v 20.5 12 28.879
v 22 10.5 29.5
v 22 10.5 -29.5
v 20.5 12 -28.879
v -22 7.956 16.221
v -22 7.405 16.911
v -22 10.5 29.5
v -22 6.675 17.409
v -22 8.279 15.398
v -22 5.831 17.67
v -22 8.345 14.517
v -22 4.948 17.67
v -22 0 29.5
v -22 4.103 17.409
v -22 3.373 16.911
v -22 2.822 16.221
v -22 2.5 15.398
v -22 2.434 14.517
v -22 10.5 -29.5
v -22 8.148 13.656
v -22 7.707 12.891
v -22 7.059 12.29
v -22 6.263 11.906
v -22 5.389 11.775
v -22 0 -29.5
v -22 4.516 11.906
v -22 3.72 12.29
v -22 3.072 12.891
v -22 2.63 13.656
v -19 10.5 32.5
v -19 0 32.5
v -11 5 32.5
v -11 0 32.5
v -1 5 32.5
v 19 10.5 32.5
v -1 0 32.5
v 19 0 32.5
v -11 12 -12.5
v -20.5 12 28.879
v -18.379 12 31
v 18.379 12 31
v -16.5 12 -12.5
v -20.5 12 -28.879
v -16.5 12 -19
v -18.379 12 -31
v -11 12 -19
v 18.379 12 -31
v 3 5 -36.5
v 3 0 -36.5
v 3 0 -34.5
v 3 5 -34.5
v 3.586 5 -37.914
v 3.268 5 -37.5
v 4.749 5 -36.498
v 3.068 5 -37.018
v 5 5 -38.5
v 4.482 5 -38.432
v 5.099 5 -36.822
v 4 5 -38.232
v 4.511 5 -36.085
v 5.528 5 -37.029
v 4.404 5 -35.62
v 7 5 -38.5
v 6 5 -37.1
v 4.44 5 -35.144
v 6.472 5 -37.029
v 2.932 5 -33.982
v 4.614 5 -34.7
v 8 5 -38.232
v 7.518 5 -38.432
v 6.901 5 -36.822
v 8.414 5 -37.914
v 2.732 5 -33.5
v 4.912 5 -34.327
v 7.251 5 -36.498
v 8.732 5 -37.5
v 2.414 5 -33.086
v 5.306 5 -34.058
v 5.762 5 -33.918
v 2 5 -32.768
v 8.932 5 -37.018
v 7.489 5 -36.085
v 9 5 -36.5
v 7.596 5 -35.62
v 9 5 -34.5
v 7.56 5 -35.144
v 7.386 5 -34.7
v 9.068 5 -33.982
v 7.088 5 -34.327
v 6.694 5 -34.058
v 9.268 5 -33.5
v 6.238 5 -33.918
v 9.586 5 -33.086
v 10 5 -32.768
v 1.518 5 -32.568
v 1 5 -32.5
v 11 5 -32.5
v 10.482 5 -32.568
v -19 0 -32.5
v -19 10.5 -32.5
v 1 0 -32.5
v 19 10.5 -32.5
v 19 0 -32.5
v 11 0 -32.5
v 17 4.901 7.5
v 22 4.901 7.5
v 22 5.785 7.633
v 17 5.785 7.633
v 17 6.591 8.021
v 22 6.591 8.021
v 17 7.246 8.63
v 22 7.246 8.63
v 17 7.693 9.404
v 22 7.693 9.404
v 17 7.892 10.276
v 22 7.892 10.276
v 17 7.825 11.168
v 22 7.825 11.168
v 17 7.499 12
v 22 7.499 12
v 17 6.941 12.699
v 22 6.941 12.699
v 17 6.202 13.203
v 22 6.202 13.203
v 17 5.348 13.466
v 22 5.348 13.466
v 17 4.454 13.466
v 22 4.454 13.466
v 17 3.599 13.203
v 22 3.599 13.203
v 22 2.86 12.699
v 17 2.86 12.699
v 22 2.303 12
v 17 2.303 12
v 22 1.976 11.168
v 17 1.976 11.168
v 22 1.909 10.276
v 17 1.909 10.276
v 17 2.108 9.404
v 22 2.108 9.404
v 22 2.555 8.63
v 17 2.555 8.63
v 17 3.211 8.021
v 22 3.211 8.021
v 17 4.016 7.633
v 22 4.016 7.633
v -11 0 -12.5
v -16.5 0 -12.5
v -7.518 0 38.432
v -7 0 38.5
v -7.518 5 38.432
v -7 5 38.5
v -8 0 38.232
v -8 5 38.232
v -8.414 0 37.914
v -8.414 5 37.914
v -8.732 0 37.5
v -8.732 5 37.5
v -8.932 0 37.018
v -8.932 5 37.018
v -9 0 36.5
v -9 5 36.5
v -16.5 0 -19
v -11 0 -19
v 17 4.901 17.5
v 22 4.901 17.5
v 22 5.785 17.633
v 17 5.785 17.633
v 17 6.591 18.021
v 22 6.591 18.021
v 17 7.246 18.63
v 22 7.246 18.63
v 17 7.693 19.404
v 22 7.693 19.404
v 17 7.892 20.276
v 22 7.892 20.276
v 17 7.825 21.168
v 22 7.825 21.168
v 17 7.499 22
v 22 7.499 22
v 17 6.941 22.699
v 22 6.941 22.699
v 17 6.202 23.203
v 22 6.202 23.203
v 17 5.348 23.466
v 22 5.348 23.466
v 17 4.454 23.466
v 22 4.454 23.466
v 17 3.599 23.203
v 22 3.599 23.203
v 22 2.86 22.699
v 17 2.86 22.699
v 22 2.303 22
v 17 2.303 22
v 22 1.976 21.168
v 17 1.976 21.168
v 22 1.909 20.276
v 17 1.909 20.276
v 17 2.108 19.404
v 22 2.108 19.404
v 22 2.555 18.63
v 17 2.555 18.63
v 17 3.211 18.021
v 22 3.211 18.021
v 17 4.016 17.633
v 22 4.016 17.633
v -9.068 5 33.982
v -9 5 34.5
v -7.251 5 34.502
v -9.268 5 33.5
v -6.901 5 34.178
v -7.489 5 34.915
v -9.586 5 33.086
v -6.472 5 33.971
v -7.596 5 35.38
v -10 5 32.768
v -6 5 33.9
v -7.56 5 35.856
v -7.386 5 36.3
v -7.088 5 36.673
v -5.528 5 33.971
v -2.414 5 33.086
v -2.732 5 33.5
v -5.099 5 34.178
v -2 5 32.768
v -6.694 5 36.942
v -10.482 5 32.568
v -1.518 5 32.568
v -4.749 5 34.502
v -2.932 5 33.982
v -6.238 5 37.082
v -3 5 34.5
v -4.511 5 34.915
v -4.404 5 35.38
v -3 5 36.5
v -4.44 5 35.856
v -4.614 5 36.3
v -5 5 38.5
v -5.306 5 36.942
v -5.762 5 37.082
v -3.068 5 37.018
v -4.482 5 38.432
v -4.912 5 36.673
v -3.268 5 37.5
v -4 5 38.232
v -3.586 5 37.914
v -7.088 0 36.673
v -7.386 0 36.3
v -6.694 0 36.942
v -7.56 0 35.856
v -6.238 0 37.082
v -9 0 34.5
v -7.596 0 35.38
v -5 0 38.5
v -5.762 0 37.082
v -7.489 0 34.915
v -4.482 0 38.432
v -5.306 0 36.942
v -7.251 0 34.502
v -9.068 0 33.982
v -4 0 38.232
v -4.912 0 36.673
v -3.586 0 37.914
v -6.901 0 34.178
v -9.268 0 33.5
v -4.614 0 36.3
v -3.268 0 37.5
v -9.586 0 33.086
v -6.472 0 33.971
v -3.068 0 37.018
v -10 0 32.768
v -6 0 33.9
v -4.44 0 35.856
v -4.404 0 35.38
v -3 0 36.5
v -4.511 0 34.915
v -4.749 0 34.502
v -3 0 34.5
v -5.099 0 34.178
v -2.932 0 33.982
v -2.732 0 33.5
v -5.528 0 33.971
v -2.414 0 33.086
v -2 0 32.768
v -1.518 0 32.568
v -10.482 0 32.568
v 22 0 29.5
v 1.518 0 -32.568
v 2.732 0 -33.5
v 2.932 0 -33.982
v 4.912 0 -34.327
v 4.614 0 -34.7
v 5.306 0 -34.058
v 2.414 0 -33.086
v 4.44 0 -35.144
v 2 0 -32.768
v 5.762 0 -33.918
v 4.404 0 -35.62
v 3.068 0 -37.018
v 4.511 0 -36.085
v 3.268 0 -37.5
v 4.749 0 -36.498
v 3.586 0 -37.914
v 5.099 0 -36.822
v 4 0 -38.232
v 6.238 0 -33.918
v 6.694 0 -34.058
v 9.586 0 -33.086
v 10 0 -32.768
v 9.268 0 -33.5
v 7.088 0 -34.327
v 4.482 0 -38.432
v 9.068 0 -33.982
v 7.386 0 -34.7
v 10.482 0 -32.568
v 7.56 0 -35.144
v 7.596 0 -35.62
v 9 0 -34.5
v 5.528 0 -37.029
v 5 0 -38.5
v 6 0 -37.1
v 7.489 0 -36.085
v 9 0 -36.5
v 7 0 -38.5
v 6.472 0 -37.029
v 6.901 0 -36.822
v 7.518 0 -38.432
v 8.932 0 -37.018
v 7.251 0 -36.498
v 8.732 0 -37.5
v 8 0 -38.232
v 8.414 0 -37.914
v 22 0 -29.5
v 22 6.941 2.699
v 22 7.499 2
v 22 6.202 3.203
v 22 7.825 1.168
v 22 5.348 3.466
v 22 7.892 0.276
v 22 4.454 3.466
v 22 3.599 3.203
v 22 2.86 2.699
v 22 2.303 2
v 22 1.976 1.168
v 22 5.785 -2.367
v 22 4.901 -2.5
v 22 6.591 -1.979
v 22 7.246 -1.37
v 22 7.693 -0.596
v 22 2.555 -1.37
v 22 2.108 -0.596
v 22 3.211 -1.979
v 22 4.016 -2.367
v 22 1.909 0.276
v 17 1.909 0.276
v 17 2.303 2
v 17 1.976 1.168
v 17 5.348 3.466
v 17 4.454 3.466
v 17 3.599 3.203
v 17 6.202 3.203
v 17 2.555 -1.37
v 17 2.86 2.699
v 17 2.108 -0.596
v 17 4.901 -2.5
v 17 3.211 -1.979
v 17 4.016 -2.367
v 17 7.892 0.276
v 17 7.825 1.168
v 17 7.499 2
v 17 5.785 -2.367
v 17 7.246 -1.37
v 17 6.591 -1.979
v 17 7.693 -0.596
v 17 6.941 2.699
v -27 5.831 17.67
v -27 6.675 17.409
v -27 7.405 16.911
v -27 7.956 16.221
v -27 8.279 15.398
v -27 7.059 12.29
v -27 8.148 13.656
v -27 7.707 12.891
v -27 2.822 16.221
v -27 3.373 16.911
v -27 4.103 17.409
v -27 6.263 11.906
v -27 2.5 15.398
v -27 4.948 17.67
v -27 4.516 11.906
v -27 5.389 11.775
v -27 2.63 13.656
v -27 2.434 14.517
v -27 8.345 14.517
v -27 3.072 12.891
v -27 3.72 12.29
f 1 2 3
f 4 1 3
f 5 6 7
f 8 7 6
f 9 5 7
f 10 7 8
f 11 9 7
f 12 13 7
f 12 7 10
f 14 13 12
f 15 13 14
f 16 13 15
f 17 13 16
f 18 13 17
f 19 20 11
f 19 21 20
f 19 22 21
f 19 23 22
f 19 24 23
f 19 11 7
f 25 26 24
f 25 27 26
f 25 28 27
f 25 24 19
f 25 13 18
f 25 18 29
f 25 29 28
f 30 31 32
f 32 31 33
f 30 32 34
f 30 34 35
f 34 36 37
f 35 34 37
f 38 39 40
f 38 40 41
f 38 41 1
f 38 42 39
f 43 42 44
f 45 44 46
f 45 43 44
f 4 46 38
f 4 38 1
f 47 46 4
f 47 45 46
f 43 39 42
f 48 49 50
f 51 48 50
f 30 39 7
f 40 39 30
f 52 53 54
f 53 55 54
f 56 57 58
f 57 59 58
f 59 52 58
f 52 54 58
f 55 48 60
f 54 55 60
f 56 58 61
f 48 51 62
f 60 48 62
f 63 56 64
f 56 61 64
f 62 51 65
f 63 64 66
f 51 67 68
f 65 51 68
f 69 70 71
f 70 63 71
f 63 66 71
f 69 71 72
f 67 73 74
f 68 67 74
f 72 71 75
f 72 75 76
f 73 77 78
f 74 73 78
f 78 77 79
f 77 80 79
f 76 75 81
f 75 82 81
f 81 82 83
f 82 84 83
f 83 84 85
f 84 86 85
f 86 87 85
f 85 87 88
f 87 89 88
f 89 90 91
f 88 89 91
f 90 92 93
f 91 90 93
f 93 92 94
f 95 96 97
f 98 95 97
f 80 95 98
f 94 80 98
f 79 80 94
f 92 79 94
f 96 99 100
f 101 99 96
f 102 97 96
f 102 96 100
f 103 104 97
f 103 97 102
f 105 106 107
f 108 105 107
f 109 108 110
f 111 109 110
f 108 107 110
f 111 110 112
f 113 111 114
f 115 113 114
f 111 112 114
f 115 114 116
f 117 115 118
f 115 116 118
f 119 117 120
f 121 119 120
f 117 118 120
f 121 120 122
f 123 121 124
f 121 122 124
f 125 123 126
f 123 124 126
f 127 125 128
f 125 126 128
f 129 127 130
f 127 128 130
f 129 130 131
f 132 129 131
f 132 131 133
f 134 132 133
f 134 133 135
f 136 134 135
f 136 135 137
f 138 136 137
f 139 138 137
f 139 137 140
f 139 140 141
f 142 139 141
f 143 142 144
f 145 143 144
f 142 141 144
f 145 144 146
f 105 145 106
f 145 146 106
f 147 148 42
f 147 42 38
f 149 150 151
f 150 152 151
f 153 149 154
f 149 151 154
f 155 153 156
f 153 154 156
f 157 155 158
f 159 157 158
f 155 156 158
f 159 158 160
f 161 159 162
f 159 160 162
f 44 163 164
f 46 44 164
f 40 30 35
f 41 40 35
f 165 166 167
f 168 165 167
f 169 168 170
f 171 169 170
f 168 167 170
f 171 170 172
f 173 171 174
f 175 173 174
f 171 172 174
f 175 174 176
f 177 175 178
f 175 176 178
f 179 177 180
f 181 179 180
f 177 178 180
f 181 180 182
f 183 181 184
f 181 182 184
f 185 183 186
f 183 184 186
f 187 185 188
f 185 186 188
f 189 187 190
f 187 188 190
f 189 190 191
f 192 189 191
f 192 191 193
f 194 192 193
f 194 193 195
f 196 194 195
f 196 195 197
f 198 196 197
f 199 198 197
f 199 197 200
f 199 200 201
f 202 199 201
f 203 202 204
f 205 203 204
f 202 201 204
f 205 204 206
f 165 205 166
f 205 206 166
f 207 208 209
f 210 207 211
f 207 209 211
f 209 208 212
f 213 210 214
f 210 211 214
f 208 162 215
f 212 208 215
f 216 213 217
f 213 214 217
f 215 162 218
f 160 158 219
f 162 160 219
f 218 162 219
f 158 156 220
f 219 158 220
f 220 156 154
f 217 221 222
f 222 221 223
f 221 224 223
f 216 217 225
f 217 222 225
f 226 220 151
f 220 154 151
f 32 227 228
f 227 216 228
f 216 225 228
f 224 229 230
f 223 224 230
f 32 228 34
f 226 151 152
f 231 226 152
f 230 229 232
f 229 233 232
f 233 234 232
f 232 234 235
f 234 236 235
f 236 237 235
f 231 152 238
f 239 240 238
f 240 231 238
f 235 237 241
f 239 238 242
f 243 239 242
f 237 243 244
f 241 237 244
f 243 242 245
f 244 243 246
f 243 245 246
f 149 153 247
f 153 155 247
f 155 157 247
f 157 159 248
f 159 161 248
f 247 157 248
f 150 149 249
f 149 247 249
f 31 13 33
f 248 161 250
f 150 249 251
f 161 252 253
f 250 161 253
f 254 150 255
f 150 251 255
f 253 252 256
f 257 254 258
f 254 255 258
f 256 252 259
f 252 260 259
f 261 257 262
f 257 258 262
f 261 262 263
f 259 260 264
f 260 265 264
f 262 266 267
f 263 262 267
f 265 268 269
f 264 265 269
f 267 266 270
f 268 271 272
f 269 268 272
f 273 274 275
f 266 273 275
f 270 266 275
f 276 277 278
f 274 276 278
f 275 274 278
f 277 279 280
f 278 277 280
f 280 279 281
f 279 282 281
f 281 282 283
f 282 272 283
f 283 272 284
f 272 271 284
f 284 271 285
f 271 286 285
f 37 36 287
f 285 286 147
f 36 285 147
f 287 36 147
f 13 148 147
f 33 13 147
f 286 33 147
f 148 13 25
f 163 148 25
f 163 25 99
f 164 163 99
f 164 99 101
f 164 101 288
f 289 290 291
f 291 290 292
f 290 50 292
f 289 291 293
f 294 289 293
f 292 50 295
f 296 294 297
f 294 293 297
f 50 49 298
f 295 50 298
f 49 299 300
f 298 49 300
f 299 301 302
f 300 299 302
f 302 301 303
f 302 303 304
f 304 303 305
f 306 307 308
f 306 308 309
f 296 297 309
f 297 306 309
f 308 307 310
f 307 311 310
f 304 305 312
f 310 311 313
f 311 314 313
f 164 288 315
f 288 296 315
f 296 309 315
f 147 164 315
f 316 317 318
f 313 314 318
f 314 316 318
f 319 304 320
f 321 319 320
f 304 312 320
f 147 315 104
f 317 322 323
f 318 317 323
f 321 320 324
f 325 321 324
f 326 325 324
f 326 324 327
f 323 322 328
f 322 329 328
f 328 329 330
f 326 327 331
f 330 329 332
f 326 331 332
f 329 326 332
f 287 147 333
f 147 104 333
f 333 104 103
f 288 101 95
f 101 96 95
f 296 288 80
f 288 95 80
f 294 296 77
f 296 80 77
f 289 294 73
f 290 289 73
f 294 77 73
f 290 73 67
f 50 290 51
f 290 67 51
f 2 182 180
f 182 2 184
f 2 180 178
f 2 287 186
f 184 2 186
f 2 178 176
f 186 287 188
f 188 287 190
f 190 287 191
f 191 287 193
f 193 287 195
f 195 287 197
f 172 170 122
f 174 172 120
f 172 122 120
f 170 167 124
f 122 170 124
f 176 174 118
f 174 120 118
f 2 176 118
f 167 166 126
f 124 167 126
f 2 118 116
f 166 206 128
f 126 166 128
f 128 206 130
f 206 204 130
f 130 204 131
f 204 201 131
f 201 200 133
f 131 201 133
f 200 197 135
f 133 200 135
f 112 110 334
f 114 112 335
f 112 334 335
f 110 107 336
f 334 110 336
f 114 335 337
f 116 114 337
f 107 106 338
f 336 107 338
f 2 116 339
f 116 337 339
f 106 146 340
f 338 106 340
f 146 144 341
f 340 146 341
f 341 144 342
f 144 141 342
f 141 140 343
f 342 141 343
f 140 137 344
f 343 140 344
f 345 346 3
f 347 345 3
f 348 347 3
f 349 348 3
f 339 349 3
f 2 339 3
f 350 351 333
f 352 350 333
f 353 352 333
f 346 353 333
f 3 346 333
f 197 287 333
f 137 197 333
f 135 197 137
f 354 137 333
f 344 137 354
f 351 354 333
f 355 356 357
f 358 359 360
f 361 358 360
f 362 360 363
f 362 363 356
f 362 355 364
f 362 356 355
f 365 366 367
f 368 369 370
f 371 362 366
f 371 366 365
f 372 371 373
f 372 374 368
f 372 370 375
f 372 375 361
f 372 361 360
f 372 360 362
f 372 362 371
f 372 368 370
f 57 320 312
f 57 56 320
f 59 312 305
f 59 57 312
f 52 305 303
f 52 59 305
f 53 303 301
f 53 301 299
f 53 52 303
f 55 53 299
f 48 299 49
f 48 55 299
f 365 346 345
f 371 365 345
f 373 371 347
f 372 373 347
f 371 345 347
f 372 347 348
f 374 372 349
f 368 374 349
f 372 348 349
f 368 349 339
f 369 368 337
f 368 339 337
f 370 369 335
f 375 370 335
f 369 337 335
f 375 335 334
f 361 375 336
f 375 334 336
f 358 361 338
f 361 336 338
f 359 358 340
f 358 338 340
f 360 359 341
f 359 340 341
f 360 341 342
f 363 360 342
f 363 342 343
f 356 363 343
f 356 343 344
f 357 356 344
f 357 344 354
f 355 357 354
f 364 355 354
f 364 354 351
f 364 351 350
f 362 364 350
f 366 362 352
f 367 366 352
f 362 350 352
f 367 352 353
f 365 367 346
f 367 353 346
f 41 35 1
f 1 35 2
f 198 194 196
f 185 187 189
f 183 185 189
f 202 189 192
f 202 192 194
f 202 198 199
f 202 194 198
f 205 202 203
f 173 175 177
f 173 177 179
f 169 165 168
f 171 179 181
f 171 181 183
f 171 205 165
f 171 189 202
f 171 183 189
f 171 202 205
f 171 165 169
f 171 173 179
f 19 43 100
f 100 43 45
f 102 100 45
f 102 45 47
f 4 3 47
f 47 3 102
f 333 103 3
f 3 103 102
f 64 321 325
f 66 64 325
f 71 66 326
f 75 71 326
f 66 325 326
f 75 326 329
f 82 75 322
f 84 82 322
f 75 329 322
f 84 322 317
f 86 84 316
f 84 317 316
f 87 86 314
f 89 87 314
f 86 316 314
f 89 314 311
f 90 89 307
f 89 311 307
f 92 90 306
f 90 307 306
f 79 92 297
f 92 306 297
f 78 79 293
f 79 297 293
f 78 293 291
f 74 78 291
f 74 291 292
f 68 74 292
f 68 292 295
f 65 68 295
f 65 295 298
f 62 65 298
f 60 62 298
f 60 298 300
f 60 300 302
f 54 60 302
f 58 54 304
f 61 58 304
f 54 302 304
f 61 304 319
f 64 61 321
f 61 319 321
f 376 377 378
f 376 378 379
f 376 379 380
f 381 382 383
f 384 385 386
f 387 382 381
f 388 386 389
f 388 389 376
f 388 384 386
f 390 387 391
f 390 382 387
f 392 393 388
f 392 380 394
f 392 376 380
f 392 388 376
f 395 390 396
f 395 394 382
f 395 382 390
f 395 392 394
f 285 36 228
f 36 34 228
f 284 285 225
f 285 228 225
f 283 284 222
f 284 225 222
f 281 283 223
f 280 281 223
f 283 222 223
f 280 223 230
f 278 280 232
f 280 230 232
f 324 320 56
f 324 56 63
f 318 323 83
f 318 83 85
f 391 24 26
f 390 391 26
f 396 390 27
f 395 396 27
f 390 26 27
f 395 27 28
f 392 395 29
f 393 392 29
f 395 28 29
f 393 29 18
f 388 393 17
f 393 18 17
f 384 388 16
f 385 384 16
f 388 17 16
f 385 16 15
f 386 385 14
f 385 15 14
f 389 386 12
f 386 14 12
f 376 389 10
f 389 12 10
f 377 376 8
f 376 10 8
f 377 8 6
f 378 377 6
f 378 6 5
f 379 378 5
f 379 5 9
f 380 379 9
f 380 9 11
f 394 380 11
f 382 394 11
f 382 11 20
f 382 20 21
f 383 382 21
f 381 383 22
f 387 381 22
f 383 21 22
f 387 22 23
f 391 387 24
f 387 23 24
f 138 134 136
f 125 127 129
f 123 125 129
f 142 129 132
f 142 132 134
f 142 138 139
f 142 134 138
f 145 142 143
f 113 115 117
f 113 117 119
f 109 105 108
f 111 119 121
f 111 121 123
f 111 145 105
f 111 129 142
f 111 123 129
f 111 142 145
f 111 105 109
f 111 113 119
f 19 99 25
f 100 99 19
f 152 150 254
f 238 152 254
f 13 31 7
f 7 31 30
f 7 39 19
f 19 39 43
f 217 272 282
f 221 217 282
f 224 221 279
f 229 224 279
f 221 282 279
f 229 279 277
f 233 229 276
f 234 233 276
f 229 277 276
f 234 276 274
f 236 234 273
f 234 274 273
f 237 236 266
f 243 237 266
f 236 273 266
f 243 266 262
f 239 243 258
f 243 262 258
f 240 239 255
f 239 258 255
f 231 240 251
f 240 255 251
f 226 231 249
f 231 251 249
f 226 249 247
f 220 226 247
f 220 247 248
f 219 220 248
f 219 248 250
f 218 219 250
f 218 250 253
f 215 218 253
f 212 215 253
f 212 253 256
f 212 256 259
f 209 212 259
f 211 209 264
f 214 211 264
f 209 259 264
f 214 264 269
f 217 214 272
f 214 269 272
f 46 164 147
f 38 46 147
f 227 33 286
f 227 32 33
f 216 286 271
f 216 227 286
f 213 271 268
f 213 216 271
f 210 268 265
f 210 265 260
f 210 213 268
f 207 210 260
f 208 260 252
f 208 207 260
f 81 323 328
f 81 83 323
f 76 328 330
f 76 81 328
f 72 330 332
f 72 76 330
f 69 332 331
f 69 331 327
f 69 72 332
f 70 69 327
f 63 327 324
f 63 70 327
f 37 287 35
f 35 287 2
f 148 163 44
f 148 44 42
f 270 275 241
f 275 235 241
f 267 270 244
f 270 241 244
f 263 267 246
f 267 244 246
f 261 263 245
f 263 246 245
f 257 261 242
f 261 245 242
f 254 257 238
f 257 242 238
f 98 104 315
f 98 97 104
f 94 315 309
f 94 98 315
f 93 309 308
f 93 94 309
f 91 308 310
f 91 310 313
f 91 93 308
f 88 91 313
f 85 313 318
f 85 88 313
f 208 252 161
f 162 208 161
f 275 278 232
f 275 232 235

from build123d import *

# Parameters (mm, degrees)
SKETCH_1_W          = 44
SKETCH_1_H          = 65
EXTRUDE_1_DEPTH     = 12
CHAMFER_1_SIZE      = 3
CHAMFER_2_SIZE      = 1.5
SKETCH_2_W          = 6
SKETCH_2_H          = 6
SKETCH_2_R          = 1.6
EXTRUDE_2_DEPTH     = 5
FILLET_1_R          = 2
FILLET_2_R          = 2
SKETCH_3_R          = 3
CUT_EXTRUDE_1_DEPTH = 5
SKETCH_4_R          = 2.96404504
EXTRUDE_3_DEPTH     = 5
SKETCH_5_W          = 5.5
SKETCH_5_H          = 6.5
CUT_EXTRUDE_2_DEPTH = 49.53091798


with BuildPart() as part:
    # 草图1 → 凸台-拉伸1 (new body)
    with BuildSketch(Plane(origin=(0, 0, 0), x_dir=(1, 0, 0), z_dir=(0, 1, 0))):
        Rectangle(SKETCH_1_W, SKETCH_1_H)
    extrude(amount=EXTRUDE_1_DEPTH)

    # 倒角1
    chamfer_1_edges = [part.edges().sort_by_distance(p)[0] for p in [
        (22, 6, 32.5),
        (-22, 6, 32.5),
        (-22, 6, -32.5),
        (22, 6, -32.5),
    ]]
    chamfer(chamfer_1_edges, length=CHAMFER_1_SIZE)

    # 倒角2
    chamfer_2_edges = [part.edges().sort_by_distance(p)[0] for p in [
        (-22, 12, 0),
        (0, 12, -32.5),
        (22, 12, 0),
        (0, 12, 32.5),
        (-20.5, 12, 31),
        (20.5, 12, 31),
        (20.5, 12, -31),
        (-20.5, 12, -31),
    ]]
    chamfer(chamfer_2_edges, length=CHAMFER_2_SIZE)

    # 草图2 → 凸台-拉伸2 (add)
    # profile 1 of 2: a face of its own
    with BuildSketch(Plane.XZ):
        with Locations((-6, 35.5)):
            Rectangle(SKETCH_2_W, SKETCH_2_H)
        with Locations(Location((-6, 35.5, 0), (0, 0, 270))):
            Circle(SKETCH_2_R, mode=Mode.SUBTRACT)
    # profile 2 of 2: a face of its own
    with BuildSketch(Plane.XZ):
        with Locations((6, -35.5)):
            Rectangle(SKETCH_2_W, SKETCH_2_H)
        with Locations(Location((6, -35.5, 0), (0, 0, 270))):
            Circle(SKETCH_2_R, mode=Mode.SUBTRACT)
    extrude(amount=-EXTRUDE_2_DEPTH)

    # 圆角1
    fillet_1_edges = [part.edges().sort_by_distance(p)[0] for p in [
        (9, 2.5, -32.5),
        (3, 2.5, -32.5),
        (-3, 2.5, 32.5),
        (-9, 2.5, 32.5),
    ]]
    fillet(fillet_1_edges, radius=FILLET_1_R)

    # 圆角2
    fillet_2_edges = [part.edges().sort_by_distance(p)[0] for p in [
        (9, 2.5, -38.5),
        (3, 2.5, -38.5),
        (-3, 2.5, 38.5),
        (-9, 2.5, 38.5),
    ]]
    fillet(fillet_2_edges, radius=FILLET_2_R)

    # 草图3 → 切除-拉伸1 (cut)
    with BuildSketch(Plane(origin=(22, 0, 0), x_dir=(0, 0, -1), z_dir=(1, 0, 0))):
        with Locations((-20.5, 4.900714175)):
            Circle(SKETCH_3_R)
        with Locations((-10.5, 4.900714175)):
            Circle(SKETCH_3_R)
        with Locations((-0.5, 4.900714175)):
            Circle(SKETCH_3_R)
    extrude(amount=-CUT_EXTRUDE_1_DEPTH, mode=Mode.SUBTRACT)

    # 草图4 → 凸台-拉伸3 (add)
    with BuildSketch(Plane.ZY.offset(22)):
        with Locations(Location((14.738572915, 5.389285653, 0), (0, 0, 180))):
            Circle(SKETCH_4_R)
    extrude(amount=EXTRUDE_3_DEPTH)

    # 草图5 → 切除-拉伸2 (cut, through all)
    with BuildSketch(Plane.XZ):
        with Locations((-13.75, -15.75)):
            Rectangle(SKETCH_5_W, SKETCH_5_H)
    extrude(amount=-CUT_EXTRUDE_2_DEPTH, mode=Mode.SUBTRACT)


solid = part.part
